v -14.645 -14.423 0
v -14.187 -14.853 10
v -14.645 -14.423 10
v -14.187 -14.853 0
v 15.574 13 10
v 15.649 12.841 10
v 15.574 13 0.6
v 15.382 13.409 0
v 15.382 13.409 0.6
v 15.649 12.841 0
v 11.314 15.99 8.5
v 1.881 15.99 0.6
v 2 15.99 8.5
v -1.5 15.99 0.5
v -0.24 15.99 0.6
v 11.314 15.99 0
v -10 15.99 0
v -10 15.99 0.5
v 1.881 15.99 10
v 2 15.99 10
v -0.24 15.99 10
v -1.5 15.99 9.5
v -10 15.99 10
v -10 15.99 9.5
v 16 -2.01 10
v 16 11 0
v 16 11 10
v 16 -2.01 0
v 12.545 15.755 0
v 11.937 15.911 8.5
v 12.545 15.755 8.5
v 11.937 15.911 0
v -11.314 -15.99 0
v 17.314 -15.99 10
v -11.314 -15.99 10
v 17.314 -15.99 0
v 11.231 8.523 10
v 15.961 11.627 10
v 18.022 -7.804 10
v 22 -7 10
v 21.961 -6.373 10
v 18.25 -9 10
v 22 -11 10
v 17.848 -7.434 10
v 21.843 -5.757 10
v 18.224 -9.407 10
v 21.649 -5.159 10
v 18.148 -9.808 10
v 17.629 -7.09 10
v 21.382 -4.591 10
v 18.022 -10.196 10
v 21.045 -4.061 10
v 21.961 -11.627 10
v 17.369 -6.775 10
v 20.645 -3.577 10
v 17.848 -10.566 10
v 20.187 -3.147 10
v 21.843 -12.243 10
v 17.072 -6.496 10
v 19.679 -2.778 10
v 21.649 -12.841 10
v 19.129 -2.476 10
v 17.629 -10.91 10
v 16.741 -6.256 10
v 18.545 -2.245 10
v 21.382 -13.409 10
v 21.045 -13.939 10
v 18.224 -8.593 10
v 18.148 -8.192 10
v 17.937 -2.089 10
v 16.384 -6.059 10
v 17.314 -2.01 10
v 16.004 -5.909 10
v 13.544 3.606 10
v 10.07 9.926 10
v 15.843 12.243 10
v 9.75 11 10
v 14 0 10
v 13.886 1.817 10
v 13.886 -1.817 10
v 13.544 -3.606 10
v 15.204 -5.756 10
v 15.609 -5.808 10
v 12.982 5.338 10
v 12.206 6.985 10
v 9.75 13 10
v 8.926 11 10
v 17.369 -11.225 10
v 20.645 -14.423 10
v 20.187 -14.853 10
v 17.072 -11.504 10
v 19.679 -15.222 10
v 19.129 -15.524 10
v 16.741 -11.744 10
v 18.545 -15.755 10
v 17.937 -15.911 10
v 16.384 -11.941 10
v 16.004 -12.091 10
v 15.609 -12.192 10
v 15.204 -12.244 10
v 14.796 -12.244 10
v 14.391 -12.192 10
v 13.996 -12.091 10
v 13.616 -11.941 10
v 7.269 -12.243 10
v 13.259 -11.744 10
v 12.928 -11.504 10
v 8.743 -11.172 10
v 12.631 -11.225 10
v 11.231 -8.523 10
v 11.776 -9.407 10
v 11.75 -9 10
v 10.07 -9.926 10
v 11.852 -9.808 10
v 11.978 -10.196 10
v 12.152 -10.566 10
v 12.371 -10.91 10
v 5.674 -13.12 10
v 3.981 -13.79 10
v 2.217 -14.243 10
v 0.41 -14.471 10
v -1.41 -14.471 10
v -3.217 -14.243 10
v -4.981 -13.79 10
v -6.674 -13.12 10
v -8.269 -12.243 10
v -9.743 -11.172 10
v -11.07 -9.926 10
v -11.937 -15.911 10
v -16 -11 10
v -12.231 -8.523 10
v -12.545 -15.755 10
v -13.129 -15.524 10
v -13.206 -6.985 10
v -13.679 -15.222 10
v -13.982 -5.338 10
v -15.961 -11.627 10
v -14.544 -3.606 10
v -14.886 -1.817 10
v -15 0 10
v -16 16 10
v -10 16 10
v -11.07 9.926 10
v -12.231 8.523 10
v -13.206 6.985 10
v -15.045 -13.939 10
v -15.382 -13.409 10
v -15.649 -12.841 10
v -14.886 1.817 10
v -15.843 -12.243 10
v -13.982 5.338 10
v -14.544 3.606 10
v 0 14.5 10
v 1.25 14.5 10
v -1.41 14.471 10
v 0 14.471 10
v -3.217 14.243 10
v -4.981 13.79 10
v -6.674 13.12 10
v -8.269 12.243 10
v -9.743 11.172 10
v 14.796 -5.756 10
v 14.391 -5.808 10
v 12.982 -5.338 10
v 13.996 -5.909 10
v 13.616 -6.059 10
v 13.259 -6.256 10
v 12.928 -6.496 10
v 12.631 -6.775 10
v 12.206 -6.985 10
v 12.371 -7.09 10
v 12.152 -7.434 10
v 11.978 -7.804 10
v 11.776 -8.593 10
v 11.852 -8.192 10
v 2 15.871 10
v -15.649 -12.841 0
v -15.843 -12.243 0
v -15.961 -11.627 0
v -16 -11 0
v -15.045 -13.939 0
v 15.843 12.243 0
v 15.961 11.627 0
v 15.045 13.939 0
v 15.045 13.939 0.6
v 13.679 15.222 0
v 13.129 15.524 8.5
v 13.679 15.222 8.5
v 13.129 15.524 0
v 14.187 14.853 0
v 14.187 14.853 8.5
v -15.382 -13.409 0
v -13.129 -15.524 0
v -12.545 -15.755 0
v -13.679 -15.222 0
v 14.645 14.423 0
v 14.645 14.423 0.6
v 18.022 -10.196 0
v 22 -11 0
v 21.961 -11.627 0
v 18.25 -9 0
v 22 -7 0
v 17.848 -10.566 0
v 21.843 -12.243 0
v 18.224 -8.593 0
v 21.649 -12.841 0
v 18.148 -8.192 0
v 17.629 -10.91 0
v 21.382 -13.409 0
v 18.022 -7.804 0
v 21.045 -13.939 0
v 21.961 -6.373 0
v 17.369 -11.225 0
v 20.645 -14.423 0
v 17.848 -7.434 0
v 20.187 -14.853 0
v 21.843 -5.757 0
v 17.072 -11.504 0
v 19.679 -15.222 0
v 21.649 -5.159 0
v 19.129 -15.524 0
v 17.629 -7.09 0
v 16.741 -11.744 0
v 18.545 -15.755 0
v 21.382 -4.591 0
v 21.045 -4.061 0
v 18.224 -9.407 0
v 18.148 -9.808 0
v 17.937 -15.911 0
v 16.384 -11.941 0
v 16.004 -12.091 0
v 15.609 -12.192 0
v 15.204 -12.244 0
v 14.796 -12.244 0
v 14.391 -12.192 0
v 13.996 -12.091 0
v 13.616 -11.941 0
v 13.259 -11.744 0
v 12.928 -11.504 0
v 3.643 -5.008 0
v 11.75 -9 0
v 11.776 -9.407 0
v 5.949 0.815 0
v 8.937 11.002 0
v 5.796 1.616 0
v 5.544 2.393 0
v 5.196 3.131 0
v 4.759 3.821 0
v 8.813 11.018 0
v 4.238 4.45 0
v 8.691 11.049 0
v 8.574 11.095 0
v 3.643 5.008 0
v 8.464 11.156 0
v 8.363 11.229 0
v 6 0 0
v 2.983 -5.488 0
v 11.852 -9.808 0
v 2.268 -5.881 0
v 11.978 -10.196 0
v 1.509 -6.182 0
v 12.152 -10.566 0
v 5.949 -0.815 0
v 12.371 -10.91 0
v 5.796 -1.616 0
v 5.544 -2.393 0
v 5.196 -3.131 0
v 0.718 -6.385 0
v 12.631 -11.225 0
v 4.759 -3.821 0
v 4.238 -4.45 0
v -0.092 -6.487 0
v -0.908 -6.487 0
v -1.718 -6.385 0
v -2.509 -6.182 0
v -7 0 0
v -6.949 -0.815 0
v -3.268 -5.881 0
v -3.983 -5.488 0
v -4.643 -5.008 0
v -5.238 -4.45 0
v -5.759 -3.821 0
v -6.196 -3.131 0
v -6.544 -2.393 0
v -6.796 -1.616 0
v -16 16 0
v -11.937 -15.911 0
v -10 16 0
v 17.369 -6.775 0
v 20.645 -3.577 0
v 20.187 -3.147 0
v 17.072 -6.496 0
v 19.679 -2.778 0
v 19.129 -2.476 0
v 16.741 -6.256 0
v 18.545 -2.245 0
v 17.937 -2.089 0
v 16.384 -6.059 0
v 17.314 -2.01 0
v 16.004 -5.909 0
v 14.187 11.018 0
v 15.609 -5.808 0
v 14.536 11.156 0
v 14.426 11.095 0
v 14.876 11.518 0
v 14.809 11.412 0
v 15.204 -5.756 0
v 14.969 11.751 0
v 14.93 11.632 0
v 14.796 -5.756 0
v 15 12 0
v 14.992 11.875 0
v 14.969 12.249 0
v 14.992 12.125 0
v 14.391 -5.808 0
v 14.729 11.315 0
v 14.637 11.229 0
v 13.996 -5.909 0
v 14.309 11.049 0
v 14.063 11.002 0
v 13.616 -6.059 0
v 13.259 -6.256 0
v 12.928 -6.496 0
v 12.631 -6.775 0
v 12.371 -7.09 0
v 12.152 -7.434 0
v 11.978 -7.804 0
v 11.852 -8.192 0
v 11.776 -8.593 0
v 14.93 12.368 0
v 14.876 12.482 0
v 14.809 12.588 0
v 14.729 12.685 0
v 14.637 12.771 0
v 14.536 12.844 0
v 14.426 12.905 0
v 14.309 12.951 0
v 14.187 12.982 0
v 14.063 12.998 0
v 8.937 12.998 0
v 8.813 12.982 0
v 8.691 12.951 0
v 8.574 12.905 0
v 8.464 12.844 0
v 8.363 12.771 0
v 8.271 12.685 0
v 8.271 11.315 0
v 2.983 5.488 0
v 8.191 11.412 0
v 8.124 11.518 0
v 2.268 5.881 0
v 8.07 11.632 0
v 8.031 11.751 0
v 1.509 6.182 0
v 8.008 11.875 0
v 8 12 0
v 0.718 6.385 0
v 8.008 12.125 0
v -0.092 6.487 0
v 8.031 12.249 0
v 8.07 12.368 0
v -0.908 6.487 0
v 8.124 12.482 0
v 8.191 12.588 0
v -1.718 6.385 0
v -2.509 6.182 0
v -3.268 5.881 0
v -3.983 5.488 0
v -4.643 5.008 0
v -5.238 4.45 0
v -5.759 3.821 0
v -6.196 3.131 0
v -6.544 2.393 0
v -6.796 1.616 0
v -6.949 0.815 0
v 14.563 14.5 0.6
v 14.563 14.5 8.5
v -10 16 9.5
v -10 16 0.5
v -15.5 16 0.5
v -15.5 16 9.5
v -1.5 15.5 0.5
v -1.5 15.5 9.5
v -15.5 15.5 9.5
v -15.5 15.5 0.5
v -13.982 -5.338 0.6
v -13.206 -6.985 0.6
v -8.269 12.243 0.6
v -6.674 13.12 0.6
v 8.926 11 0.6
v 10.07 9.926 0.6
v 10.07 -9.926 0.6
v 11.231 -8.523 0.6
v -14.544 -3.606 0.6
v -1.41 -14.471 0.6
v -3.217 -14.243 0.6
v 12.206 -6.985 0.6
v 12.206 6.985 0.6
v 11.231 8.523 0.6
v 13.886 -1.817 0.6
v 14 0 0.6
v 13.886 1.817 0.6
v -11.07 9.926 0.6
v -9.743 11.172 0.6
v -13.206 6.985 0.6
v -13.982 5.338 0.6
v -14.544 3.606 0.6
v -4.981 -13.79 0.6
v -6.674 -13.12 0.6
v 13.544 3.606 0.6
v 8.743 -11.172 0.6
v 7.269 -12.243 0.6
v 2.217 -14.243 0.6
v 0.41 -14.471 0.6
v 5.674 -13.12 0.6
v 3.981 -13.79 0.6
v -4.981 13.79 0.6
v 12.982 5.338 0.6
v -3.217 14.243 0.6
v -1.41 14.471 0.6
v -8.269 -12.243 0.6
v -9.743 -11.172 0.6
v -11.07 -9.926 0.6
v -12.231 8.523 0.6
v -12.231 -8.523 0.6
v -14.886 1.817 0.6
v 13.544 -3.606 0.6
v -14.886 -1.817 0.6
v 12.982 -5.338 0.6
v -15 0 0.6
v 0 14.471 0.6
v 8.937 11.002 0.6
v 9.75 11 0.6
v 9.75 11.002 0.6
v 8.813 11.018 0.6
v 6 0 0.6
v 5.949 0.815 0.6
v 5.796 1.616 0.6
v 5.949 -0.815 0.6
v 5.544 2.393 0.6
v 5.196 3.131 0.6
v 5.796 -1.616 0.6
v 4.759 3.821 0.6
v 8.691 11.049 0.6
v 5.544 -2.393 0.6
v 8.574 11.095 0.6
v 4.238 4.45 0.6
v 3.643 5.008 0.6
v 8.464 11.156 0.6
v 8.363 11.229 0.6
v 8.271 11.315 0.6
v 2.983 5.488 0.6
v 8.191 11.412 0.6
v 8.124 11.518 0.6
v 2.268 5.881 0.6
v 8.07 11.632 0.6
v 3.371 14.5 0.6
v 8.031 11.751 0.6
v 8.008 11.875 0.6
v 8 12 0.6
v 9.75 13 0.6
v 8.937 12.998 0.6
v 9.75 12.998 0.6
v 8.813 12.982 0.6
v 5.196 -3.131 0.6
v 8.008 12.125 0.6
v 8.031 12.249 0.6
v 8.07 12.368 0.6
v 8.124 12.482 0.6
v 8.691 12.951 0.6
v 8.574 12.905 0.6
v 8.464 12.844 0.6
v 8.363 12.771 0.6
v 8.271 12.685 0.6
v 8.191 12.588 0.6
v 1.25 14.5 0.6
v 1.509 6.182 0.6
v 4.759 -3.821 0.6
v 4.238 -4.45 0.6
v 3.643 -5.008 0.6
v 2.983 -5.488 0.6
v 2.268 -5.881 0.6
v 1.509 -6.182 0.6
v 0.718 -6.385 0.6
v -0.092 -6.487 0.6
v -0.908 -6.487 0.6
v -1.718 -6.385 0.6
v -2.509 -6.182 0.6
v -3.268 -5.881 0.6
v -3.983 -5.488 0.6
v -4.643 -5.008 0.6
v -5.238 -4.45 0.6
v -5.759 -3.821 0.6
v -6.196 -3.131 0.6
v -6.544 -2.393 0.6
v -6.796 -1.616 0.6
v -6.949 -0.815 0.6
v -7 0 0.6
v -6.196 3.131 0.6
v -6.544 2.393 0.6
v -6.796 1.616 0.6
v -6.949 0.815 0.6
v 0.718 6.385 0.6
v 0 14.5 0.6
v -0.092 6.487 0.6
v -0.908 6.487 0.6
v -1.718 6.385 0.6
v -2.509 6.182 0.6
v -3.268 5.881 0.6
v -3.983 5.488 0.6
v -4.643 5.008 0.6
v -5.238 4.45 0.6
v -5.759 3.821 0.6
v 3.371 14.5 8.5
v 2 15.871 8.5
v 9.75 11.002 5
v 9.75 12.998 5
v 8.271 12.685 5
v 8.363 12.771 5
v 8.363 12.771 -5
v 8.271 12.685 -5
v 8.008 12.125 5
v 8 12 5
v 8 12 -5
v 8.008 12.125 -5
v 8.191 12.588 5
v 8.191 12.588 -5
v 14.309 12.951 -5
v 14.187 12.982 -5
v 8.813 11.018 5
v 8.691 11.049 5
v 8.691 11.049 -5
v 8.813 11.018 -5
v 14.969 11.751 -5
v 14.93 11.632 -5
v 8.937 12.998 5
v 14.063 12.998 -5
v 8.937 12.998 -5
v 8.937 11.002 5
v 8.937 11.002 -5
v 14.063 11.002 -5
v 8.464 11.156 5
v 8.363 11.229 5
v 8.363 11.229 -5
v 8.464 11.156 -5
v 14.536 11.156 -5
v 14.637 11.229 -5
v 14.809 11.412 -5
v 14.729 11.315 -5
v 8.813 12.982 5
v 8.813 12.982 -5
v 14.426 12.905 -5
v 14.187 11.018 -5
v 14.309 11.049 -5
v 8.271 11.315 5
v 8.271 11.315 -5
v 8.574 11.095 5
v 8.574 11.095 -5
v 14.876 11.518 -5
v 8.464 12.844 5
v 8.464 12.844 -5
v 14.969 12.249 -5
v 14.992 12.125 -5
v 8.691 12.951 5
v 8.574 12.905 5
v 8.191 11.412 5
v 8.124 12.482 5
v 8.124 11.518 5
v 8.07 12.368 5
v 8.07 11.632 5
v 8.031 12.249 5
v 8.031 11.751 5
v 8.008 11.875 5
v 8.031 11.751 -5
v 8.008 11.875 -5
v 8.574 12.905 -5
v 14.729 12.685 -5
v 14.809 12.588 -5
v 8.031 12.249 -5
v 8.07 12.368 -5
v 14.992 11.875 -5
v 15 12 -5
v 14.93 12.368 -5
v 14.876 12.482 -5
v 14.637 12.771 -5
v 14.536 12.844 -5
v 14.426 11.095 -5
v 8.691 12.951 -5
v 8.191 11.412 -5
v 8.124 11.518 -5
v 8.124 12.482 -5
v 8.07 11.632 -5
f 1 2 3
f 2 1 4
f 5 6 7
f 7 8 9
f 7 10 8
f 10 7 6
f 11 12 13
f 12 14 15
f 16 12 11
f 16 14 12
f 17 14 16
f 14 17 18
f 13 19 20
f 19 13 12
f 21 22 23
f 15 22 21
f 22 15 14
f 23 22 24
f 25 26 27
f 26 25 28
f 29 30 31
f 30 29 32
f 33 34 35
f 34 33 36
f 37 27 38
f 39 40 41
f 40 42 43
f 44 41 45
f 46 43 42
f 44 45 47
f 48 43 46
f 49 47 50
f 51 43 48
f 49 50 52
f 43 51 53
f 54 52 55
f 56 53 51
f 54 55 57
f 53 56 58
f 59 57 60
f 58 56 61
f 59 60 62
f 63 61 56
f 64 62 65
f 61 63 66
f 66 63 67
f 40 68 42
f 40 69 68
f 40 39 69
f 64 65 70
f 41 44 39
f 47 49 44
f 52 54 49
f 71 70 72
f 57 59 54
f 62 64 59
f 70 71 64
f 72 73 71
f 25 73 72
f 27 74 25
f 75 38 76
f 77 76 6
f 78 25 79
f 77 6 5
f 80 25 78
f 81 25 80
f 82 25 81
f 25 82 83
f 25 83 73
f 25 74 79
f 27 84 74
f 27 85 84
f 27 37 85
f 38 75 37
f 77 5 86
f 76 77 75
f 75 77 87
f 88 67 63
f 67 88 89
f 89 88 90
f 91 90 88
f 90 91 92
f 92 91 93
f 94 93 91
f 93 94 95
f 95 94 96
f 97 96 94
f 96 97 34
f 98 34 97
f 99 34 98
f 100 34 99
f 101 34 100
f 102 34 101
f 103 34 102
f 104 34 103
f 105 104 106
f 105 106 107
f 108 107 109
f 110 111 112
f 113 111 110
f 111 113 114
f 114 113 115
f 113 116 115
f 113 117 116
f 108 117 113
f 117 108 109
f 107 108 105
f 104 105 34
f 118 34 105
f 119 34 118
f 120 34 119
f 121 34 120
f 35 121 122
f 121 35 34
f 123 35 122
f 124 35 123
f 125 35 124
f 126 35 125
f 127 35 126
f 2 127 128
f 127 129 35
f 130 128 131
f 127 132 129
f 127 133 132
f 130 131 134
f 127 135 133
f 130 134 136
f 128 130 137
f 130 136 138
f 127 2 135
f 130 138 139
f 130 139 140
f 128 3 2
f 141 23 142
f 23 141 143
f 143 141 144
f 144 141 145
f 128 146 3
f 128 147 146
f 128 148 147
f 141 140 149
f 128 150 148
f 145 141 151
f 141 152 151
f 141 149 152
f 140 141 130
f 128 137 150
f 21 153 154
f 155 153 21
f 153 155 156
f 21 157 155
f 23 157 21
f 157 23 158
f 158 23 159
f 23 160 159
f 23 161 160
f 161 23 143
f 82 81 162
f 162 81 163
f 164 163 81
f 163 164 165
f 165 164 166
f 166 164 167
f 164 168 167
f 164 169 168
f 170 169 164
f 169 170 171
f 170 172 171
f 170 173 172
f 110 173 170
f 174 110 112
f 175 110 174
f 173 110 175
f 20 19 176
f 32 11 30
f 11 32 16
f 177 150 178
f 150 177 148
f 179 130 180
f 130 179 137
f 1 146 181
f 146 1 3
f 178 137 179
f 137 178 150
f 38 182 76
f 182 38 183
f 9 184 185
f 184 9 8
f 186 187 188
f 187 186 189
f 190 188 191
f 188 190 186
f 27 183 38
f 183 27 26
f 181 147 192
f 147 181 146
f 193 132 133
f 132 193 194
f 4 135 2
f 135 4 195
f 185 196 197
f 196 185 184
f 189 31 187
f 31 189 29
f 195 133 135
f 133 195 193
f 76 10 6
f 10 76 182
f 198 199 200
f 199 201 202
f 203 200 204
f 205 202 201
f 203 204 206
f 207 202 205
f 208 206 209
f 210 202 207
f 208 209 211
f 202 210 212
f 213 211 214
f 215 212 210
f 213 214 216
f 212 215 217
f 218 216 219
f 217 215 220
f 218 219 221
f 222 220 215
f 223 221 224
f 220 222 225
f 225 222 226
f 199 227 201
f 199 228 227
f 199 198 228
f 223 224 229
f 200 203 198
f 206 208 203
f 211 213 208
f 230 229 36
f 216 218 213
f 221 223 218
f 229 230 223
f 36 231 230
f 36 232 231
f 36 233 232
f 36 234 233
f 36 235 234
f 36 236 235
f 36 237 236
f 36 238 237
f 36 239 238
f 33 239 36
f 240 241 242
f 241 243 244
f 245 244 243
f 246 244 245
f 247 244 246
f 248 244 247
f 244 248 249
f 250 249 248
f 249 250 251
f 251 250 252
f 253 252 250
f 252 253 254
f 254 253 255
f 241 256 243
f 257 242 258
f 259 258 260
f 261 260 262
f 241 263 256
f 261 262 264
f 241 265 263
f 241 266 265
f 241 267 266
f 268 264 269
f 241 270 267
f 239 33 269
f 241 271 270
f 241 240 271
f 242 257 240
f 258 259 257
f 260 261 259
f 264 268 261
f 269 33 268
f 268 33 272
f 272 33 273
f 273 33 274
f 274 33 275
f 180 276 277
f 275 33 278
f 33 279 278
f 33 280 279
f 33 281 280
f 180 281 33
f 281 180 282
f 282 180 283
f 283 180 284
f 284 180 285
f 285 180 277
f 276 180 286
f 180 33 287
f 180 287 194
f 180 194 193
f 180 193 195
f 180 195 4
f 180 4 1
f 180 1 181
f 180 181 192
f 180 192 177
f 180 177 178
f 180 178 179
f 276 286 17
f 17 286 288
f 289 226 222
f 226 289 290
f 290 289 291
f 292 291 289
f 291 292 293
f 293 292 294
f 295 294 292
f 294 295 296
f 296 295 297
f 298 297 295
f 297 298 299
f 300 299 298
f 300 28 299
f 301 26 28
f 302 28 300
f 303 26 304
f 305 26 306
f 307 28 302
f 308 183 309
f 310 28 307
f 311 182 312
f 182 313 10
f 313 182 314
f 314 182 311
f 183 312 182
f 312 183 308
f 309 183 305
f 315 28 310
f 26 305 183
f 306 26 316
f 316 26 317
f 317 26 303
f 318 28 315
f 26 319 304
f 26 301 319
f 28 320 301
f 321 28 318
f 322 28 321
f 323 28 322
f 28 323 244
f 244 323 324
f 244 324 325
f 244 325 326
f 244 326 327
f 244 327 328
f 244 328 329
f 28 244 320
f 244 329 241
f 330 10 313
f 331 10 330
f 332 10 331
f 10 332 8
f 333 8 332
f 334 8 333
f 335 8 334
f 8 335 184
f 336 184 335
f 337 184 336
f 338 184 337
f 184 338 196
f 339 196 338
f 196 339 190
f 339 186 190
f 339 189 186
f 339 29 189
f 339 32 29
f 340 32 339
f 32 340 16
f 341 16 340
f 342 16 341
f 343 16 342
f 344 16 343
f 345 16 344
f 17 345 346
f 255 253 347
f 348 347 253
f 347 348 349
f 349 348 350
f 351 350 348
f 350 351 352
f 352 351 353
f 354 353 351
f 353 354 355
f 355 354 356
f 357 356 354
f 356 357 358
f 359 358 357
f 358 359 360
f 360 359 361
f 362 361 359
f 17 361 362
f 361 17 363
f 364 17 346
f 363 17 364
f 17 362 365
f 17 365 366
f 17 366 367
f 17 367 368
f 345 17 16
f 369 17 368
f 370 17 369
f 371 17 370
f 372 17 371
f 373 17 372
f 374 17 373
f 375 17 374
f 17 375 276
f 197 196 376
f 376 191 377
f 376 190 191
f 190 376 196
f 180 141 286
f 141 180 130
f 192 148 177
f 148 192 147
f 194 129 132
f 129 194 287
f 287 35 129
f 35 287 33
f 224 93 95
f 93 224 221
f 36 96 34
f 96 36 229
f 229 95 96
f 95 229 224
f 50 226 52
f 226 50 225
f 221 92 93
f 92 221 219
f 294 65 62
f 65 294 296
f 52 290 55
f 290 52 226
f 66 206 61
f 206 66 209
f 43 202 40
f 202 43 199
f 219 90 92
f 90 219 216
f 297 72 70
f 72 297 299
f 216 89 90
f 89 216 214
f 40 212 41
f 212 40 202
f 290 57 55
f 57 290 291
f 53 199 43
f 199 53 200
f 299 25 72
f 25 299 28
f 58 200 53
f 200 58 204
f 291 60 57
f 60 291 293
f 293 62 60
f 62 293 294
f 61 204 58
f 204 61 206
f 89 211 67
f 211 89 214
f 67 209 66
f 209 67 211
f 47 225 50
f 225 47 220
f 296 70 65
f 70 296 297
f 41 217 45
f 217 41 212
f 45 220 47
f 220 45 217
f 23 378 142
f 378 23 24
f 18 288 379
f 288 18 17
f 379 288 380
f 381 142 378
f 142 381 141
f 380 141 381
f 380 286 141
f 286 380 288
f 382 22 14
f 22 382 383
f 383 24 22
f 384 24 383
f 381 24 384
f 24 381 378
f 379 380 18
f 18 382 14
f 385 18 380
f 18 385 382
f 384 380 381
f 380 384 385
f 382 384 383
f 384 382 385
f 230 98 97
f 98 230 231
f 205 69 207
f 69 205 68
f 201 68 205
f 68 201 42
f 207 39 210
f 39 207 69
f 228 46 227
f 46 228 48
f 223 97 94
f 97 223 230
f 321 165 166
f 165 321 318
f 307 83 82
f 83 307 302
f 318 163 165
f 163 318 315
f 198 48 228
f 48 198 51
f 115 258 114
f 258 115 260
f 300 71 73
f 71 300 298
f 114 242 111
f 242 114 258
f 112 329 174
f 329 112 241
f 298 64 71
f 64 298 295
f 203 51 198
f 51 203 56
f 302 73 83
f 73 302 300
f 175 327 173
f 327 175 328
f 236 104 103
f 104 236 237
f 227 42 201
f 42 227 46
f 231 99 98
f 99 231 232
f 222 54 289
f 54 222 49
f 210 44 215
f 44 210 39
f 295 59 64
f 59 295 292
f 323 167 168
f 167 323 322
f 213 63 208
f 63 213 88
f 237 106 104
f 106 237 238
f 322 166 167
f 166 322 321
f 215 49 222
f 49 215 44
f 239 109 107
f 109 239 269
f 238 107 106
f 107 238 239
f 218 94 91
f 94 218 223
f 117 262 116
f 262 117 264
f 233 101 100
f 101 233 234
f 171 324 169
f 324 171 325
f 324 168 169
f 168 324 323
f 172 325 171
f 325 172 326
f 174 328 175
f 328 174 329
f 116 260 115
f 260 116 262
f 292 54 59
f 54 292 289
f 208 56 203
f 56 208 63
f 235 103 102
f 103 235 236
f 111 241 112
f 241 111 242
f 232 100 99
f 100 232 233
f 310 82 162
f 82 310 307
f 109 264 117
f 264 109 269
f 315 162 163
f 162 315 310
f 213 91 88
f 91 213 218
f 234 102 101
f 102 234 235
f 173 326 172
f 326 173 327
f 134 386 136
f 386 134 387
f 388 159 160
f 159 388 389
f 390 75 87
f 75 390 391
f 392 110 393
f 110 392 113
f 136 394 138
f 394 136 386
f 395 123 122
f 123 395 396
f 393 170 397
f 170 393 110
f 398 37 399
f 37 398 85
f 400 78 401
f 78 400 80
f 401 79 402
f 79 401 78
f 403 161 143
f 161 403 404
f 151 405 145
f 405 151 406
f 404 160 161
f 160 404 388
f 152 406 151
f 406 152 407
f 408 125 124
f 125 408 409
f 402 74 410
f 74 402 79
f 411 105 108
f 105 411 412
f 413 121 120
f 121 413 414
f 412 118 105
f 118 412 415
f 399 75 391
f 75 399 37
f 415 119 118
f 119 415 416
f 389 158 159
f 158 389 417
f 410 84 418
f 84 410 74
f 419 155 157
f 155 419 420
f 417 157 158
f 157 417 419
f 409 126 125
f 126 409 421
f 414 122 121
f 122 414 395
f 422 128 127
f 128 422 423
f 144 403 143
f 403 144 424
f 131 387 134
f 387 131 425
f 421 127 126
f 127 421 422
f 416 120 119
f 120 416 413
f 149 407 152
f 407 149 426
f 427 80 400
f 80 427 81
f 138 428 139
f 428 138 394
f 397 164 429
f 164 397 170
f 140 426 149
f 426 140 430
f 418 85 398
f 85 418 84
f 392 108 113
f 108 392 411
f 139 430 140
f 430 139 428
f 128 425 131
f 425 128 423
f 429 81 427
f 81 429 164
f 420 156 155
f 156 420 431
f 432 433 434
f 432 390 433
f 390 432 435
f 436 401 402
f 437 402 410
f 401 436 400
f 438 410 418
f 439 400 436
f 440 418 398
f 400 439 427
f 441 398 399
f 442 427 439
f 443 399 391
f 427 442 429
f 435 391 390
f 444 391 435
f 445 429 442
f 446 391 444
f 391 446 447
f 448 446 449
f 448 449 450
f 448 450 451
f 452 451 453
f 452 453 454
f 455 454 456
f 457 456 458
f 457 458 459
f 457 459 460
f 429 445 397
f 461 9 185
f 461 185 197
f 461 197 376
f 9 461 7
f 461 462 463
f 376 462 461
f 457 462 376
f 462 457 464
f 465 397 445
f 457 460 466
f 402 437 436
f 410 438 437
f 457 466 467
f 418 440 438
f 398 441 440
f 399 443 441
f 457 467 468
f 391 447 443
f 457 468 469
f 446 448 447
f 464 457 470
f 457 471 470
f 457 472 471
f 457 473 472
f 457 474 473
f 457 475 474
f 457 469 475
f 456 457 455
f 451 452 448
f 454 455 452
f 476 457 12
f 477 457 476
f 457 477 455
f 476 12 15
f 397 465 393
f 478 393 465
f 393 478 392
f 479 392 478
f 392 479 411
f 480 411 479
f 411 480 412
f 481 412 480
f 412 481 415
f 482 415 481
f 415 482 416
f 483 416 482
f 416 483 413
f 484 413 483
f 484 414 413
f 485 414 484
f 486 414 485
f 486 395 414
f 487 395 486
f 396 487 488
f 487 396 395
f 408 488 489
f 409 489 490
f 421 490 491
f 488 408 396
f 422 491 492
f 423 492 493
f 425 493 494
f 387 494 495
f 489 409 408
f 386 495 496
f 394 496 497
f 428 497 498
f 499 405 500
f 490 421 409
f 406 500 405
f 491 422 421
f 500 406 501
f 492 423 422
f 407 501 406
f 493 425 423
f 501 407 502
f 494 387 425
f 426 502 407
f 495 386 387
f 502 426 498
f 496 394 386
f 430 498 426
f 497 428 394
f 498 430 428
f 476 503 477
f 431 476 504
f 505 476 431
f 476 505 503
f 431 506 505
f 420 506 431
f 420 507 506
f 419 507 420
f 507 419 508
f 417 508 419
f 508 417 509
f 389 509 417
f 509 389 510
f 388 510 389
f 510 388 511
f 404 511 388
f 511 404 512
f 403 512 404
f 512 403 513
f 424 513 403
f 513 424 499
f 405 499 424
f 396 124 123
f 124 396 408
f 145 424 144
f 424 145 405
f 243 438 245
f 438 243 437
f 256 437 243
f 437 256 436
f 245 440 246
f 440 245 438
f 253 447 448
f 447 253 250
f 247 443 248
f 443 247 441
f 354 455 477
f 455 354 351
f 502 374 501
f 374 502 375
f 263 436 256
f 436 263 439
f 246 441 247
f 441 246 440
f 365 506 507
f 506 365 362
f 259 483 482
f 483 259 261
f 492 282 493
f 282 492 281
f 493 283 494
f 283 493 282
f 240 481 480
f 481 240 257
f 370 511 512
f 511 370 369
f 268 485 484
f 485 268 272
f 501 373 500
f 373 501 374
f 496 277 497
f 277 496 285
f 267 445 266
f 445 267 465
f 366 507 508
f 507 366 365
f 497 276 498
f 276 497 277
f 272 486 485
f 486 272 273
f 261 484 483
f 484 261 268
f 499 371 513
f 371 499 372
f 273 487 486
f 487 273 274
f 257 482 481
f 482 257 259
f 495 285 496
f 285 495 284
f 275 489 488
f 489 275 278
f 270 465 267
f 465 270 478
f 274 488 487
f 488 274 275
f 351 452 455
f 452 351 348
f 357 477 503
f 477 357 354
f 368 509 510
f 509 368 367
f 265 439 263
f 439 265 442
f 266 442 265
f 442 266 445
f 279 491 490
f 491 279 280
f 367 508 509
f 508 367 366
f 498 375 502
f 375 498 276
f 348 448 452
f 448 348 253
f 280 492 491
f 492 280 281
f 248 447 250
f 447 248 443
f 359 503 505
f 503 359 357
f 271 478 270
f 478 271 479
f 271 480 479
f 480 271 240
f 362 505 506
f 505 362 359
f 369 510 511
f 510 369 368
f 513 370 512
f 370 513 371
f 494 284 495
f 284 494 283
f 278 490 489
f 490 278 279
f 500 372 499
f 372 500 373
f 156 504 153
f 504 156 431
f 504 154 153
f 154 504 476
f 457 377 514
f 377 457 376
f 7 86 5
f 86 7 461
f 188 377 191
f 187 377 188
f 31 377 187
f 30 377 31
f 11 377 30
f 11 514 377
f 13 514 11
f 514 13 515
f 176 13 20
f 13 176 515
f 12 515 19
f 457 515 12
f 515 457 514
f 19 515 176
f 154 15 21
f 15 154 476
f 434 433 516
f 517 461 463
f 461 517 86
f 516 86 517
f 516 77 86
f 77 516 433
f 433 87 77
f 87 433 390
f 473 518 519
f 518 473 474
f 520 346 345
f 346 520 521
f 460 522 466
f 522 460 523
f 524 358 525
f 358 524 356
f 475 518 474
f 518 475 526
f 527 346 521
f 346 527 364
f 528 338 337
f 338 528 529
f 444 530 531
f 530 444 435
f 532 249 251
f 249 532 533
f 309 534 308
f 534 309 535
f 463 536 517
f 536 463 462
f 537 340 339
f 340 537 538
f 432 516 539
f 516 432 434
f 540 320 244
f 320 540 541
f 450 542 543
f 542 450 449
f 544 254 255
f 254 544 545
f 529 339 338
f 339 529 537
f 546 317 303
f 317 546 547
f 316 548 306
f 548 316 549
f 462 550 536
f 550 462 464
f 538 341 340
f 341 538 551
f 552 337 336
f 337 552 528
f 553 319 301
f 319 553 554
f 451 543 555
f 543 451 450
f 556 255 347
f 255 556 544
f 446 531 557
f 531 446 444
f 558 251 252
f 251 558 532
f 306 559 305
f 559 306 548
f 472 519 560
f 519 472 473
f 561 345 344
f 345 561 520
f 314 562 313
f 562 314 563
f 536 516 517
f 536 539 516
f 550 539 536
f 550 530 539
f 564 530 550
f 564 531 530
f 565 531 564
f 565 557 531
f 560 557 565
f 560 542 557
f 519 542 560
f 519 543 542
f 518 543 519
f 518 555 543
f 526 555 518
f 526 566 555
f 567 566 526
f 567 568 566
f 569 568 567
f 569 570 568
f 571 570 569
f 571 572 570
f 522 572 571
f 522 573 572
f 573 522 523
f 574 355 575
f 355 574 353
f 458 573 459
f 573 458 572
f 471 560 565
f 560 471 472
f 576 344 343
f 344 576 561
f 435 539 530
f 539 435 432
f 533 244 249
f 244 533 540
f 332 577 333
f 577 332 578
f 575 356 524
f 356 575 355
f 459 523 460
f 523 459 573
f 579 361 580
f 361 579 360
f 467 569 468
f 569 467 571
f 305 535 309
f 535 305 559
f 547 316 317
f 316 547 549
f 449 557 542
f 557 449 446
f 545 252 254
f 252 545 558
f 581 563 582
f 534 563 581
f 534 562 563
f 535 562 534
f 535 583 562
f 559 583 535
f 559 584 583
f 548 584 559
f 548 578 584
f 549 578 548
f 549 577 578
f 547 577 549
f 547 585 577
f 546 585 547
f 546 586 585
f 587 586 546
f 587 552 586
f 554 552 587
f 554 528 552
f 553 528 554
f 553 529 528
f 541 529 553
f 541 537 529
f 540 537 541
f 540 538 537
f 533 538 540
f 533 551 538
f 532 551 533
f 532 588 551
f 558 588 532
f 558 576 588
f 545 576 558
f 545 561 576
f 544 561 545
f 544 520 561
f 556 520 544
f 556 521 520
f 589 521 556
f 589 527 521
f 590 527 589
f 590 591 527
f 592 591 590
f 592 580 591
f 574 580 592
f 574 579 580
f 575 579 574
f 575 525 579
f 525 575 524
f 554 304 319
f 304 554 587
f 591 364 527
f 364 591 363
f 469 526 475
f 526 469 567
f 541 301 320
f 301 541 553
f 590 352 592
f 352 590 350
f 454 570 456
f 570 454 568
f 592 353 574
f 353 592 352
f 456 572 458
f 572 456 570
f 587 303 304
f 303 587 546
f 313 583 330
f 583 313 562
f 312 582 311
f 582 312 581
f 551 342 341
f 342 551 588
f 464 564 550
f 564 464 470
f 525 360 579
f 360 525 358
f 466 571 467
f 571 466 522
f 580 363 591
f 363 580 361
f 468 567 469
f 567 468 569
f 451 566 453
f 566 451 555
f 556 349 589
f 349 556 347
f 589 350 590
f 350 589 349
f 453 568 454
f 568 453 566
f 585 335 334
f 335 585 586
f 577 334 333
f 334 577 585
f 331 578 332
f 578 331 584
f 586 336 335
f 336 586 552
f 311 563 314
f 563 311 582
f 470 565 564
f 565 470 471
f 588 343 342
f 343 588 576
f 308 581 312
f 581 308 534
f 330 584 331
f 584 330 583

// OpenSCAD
$fn = 50;


union() {
	difference() {
		union() {
			hull() {
				translate(v = [-11.0000000000, 11.0000000000, 0]) {
					cylinder(h = 10, r = 5);
				}
				translate(v = [11.0000000000, 11.0000000000, 0]) {
					cylinder(h = 10, r = 5);
				}
				translate(v = [-11.0000000000, -11.0000000000, 0]) {
					cylinder(h = 10, r = 5);
				}
				translate(v = [11.0000000000, -11.0000000000, 0]) {
					cylinder(h = 10, r = 5);
				}
			}
			translate(v = [7.5000000000, -9.0000000000, 0]) {
				hull() {
					translate(v = [-9.5000000000, 2.0000000000, 0]) {
						cylinder(h = 10, r = 5);
					}
					translate(v = [9.5000000000, 2.0000000000, 0]) {
						cylinder(h = 10, r = 5);
					}
					translate(v = [-9.5000000000, -2.0000000000, 0]) {
						cylinder(h = 10, r = 5);
					}
					translate(v = [9.5000000000, -2.0000000000, 0]) {
						cylinder(h = 10, r = 5);
					}
				}
			}
			translate(v = [-16.0000000000, 10.0000000000, 0]) {
				cube(size = [6, 6, 10]);
			}
		}
		union() {
			translate(v = [-15.5000000000, 15.5000000000, 0.5000000000]) {
				cube(size = [14, 0.5000000000, 9.0000000000]);
			}
			translate(v = [15.0000000000, -9.0000000000, -100.0000000000]) {
				cylinder(h = 200, r = 3.2500000000);
			}
			translate(v = [-0.5000000000, 0.0000000000, 0.6000000000]) {
				cylinder(h = 12.4000000000, r = 14.5000000000);
			}
			translate(v = [-0.5000000000, 0.0000000000, -5.0000000000]) {
				cylinder(h = 10, r = 6.5000000000);
			}
			translate(v = [0.0000000000, 13.0000000000, 0.6000000000]) {
				cube(size = [16.0000000000, 1.5000000000, 12.4000000000]);
			}
			translate(v = [2.0000000000, 13.0000000000, 8.5000000000]) {
				cube(size = [14.0000000000, 4.5000000000, 1.5000000000]);
			}
			translate(v = [-3.0000000000, 18.7500000000, 0.6000000000]) {
				rotate(a = [0, 0, -45]) {
					cube(size = [10, 1.5000000000, 12.4000000000]);
				}
			}
			translate(v = [2.2500000000, 11.0000000000, 0.6000000000]) {
				cube(size = [7.5000000000, 2, 9.4000000000]);
			}
		}
	}
	union() {
		translate(v = [11.5000000000, 12, -5.0000000000]) {
			rotate(a = [0, 0, 0]) {
				difference() {
					union() {
						hull() {
							translate(v = [2.5000000000, 0, 0]) {
								cylinder(h = 10, r = 1.0000000000, r1 = 1.0000000000, r2 = 1.0000000000);
							}
							translate(v = [-2.5000000000, 0, 0]) {
								cylinder(h = 10, r = 1.0000000000, r1 = 1.0000000000, r2 = 1.0000000000);
							}
						}
					}
					union();
				}
			}
		}
	}
}
